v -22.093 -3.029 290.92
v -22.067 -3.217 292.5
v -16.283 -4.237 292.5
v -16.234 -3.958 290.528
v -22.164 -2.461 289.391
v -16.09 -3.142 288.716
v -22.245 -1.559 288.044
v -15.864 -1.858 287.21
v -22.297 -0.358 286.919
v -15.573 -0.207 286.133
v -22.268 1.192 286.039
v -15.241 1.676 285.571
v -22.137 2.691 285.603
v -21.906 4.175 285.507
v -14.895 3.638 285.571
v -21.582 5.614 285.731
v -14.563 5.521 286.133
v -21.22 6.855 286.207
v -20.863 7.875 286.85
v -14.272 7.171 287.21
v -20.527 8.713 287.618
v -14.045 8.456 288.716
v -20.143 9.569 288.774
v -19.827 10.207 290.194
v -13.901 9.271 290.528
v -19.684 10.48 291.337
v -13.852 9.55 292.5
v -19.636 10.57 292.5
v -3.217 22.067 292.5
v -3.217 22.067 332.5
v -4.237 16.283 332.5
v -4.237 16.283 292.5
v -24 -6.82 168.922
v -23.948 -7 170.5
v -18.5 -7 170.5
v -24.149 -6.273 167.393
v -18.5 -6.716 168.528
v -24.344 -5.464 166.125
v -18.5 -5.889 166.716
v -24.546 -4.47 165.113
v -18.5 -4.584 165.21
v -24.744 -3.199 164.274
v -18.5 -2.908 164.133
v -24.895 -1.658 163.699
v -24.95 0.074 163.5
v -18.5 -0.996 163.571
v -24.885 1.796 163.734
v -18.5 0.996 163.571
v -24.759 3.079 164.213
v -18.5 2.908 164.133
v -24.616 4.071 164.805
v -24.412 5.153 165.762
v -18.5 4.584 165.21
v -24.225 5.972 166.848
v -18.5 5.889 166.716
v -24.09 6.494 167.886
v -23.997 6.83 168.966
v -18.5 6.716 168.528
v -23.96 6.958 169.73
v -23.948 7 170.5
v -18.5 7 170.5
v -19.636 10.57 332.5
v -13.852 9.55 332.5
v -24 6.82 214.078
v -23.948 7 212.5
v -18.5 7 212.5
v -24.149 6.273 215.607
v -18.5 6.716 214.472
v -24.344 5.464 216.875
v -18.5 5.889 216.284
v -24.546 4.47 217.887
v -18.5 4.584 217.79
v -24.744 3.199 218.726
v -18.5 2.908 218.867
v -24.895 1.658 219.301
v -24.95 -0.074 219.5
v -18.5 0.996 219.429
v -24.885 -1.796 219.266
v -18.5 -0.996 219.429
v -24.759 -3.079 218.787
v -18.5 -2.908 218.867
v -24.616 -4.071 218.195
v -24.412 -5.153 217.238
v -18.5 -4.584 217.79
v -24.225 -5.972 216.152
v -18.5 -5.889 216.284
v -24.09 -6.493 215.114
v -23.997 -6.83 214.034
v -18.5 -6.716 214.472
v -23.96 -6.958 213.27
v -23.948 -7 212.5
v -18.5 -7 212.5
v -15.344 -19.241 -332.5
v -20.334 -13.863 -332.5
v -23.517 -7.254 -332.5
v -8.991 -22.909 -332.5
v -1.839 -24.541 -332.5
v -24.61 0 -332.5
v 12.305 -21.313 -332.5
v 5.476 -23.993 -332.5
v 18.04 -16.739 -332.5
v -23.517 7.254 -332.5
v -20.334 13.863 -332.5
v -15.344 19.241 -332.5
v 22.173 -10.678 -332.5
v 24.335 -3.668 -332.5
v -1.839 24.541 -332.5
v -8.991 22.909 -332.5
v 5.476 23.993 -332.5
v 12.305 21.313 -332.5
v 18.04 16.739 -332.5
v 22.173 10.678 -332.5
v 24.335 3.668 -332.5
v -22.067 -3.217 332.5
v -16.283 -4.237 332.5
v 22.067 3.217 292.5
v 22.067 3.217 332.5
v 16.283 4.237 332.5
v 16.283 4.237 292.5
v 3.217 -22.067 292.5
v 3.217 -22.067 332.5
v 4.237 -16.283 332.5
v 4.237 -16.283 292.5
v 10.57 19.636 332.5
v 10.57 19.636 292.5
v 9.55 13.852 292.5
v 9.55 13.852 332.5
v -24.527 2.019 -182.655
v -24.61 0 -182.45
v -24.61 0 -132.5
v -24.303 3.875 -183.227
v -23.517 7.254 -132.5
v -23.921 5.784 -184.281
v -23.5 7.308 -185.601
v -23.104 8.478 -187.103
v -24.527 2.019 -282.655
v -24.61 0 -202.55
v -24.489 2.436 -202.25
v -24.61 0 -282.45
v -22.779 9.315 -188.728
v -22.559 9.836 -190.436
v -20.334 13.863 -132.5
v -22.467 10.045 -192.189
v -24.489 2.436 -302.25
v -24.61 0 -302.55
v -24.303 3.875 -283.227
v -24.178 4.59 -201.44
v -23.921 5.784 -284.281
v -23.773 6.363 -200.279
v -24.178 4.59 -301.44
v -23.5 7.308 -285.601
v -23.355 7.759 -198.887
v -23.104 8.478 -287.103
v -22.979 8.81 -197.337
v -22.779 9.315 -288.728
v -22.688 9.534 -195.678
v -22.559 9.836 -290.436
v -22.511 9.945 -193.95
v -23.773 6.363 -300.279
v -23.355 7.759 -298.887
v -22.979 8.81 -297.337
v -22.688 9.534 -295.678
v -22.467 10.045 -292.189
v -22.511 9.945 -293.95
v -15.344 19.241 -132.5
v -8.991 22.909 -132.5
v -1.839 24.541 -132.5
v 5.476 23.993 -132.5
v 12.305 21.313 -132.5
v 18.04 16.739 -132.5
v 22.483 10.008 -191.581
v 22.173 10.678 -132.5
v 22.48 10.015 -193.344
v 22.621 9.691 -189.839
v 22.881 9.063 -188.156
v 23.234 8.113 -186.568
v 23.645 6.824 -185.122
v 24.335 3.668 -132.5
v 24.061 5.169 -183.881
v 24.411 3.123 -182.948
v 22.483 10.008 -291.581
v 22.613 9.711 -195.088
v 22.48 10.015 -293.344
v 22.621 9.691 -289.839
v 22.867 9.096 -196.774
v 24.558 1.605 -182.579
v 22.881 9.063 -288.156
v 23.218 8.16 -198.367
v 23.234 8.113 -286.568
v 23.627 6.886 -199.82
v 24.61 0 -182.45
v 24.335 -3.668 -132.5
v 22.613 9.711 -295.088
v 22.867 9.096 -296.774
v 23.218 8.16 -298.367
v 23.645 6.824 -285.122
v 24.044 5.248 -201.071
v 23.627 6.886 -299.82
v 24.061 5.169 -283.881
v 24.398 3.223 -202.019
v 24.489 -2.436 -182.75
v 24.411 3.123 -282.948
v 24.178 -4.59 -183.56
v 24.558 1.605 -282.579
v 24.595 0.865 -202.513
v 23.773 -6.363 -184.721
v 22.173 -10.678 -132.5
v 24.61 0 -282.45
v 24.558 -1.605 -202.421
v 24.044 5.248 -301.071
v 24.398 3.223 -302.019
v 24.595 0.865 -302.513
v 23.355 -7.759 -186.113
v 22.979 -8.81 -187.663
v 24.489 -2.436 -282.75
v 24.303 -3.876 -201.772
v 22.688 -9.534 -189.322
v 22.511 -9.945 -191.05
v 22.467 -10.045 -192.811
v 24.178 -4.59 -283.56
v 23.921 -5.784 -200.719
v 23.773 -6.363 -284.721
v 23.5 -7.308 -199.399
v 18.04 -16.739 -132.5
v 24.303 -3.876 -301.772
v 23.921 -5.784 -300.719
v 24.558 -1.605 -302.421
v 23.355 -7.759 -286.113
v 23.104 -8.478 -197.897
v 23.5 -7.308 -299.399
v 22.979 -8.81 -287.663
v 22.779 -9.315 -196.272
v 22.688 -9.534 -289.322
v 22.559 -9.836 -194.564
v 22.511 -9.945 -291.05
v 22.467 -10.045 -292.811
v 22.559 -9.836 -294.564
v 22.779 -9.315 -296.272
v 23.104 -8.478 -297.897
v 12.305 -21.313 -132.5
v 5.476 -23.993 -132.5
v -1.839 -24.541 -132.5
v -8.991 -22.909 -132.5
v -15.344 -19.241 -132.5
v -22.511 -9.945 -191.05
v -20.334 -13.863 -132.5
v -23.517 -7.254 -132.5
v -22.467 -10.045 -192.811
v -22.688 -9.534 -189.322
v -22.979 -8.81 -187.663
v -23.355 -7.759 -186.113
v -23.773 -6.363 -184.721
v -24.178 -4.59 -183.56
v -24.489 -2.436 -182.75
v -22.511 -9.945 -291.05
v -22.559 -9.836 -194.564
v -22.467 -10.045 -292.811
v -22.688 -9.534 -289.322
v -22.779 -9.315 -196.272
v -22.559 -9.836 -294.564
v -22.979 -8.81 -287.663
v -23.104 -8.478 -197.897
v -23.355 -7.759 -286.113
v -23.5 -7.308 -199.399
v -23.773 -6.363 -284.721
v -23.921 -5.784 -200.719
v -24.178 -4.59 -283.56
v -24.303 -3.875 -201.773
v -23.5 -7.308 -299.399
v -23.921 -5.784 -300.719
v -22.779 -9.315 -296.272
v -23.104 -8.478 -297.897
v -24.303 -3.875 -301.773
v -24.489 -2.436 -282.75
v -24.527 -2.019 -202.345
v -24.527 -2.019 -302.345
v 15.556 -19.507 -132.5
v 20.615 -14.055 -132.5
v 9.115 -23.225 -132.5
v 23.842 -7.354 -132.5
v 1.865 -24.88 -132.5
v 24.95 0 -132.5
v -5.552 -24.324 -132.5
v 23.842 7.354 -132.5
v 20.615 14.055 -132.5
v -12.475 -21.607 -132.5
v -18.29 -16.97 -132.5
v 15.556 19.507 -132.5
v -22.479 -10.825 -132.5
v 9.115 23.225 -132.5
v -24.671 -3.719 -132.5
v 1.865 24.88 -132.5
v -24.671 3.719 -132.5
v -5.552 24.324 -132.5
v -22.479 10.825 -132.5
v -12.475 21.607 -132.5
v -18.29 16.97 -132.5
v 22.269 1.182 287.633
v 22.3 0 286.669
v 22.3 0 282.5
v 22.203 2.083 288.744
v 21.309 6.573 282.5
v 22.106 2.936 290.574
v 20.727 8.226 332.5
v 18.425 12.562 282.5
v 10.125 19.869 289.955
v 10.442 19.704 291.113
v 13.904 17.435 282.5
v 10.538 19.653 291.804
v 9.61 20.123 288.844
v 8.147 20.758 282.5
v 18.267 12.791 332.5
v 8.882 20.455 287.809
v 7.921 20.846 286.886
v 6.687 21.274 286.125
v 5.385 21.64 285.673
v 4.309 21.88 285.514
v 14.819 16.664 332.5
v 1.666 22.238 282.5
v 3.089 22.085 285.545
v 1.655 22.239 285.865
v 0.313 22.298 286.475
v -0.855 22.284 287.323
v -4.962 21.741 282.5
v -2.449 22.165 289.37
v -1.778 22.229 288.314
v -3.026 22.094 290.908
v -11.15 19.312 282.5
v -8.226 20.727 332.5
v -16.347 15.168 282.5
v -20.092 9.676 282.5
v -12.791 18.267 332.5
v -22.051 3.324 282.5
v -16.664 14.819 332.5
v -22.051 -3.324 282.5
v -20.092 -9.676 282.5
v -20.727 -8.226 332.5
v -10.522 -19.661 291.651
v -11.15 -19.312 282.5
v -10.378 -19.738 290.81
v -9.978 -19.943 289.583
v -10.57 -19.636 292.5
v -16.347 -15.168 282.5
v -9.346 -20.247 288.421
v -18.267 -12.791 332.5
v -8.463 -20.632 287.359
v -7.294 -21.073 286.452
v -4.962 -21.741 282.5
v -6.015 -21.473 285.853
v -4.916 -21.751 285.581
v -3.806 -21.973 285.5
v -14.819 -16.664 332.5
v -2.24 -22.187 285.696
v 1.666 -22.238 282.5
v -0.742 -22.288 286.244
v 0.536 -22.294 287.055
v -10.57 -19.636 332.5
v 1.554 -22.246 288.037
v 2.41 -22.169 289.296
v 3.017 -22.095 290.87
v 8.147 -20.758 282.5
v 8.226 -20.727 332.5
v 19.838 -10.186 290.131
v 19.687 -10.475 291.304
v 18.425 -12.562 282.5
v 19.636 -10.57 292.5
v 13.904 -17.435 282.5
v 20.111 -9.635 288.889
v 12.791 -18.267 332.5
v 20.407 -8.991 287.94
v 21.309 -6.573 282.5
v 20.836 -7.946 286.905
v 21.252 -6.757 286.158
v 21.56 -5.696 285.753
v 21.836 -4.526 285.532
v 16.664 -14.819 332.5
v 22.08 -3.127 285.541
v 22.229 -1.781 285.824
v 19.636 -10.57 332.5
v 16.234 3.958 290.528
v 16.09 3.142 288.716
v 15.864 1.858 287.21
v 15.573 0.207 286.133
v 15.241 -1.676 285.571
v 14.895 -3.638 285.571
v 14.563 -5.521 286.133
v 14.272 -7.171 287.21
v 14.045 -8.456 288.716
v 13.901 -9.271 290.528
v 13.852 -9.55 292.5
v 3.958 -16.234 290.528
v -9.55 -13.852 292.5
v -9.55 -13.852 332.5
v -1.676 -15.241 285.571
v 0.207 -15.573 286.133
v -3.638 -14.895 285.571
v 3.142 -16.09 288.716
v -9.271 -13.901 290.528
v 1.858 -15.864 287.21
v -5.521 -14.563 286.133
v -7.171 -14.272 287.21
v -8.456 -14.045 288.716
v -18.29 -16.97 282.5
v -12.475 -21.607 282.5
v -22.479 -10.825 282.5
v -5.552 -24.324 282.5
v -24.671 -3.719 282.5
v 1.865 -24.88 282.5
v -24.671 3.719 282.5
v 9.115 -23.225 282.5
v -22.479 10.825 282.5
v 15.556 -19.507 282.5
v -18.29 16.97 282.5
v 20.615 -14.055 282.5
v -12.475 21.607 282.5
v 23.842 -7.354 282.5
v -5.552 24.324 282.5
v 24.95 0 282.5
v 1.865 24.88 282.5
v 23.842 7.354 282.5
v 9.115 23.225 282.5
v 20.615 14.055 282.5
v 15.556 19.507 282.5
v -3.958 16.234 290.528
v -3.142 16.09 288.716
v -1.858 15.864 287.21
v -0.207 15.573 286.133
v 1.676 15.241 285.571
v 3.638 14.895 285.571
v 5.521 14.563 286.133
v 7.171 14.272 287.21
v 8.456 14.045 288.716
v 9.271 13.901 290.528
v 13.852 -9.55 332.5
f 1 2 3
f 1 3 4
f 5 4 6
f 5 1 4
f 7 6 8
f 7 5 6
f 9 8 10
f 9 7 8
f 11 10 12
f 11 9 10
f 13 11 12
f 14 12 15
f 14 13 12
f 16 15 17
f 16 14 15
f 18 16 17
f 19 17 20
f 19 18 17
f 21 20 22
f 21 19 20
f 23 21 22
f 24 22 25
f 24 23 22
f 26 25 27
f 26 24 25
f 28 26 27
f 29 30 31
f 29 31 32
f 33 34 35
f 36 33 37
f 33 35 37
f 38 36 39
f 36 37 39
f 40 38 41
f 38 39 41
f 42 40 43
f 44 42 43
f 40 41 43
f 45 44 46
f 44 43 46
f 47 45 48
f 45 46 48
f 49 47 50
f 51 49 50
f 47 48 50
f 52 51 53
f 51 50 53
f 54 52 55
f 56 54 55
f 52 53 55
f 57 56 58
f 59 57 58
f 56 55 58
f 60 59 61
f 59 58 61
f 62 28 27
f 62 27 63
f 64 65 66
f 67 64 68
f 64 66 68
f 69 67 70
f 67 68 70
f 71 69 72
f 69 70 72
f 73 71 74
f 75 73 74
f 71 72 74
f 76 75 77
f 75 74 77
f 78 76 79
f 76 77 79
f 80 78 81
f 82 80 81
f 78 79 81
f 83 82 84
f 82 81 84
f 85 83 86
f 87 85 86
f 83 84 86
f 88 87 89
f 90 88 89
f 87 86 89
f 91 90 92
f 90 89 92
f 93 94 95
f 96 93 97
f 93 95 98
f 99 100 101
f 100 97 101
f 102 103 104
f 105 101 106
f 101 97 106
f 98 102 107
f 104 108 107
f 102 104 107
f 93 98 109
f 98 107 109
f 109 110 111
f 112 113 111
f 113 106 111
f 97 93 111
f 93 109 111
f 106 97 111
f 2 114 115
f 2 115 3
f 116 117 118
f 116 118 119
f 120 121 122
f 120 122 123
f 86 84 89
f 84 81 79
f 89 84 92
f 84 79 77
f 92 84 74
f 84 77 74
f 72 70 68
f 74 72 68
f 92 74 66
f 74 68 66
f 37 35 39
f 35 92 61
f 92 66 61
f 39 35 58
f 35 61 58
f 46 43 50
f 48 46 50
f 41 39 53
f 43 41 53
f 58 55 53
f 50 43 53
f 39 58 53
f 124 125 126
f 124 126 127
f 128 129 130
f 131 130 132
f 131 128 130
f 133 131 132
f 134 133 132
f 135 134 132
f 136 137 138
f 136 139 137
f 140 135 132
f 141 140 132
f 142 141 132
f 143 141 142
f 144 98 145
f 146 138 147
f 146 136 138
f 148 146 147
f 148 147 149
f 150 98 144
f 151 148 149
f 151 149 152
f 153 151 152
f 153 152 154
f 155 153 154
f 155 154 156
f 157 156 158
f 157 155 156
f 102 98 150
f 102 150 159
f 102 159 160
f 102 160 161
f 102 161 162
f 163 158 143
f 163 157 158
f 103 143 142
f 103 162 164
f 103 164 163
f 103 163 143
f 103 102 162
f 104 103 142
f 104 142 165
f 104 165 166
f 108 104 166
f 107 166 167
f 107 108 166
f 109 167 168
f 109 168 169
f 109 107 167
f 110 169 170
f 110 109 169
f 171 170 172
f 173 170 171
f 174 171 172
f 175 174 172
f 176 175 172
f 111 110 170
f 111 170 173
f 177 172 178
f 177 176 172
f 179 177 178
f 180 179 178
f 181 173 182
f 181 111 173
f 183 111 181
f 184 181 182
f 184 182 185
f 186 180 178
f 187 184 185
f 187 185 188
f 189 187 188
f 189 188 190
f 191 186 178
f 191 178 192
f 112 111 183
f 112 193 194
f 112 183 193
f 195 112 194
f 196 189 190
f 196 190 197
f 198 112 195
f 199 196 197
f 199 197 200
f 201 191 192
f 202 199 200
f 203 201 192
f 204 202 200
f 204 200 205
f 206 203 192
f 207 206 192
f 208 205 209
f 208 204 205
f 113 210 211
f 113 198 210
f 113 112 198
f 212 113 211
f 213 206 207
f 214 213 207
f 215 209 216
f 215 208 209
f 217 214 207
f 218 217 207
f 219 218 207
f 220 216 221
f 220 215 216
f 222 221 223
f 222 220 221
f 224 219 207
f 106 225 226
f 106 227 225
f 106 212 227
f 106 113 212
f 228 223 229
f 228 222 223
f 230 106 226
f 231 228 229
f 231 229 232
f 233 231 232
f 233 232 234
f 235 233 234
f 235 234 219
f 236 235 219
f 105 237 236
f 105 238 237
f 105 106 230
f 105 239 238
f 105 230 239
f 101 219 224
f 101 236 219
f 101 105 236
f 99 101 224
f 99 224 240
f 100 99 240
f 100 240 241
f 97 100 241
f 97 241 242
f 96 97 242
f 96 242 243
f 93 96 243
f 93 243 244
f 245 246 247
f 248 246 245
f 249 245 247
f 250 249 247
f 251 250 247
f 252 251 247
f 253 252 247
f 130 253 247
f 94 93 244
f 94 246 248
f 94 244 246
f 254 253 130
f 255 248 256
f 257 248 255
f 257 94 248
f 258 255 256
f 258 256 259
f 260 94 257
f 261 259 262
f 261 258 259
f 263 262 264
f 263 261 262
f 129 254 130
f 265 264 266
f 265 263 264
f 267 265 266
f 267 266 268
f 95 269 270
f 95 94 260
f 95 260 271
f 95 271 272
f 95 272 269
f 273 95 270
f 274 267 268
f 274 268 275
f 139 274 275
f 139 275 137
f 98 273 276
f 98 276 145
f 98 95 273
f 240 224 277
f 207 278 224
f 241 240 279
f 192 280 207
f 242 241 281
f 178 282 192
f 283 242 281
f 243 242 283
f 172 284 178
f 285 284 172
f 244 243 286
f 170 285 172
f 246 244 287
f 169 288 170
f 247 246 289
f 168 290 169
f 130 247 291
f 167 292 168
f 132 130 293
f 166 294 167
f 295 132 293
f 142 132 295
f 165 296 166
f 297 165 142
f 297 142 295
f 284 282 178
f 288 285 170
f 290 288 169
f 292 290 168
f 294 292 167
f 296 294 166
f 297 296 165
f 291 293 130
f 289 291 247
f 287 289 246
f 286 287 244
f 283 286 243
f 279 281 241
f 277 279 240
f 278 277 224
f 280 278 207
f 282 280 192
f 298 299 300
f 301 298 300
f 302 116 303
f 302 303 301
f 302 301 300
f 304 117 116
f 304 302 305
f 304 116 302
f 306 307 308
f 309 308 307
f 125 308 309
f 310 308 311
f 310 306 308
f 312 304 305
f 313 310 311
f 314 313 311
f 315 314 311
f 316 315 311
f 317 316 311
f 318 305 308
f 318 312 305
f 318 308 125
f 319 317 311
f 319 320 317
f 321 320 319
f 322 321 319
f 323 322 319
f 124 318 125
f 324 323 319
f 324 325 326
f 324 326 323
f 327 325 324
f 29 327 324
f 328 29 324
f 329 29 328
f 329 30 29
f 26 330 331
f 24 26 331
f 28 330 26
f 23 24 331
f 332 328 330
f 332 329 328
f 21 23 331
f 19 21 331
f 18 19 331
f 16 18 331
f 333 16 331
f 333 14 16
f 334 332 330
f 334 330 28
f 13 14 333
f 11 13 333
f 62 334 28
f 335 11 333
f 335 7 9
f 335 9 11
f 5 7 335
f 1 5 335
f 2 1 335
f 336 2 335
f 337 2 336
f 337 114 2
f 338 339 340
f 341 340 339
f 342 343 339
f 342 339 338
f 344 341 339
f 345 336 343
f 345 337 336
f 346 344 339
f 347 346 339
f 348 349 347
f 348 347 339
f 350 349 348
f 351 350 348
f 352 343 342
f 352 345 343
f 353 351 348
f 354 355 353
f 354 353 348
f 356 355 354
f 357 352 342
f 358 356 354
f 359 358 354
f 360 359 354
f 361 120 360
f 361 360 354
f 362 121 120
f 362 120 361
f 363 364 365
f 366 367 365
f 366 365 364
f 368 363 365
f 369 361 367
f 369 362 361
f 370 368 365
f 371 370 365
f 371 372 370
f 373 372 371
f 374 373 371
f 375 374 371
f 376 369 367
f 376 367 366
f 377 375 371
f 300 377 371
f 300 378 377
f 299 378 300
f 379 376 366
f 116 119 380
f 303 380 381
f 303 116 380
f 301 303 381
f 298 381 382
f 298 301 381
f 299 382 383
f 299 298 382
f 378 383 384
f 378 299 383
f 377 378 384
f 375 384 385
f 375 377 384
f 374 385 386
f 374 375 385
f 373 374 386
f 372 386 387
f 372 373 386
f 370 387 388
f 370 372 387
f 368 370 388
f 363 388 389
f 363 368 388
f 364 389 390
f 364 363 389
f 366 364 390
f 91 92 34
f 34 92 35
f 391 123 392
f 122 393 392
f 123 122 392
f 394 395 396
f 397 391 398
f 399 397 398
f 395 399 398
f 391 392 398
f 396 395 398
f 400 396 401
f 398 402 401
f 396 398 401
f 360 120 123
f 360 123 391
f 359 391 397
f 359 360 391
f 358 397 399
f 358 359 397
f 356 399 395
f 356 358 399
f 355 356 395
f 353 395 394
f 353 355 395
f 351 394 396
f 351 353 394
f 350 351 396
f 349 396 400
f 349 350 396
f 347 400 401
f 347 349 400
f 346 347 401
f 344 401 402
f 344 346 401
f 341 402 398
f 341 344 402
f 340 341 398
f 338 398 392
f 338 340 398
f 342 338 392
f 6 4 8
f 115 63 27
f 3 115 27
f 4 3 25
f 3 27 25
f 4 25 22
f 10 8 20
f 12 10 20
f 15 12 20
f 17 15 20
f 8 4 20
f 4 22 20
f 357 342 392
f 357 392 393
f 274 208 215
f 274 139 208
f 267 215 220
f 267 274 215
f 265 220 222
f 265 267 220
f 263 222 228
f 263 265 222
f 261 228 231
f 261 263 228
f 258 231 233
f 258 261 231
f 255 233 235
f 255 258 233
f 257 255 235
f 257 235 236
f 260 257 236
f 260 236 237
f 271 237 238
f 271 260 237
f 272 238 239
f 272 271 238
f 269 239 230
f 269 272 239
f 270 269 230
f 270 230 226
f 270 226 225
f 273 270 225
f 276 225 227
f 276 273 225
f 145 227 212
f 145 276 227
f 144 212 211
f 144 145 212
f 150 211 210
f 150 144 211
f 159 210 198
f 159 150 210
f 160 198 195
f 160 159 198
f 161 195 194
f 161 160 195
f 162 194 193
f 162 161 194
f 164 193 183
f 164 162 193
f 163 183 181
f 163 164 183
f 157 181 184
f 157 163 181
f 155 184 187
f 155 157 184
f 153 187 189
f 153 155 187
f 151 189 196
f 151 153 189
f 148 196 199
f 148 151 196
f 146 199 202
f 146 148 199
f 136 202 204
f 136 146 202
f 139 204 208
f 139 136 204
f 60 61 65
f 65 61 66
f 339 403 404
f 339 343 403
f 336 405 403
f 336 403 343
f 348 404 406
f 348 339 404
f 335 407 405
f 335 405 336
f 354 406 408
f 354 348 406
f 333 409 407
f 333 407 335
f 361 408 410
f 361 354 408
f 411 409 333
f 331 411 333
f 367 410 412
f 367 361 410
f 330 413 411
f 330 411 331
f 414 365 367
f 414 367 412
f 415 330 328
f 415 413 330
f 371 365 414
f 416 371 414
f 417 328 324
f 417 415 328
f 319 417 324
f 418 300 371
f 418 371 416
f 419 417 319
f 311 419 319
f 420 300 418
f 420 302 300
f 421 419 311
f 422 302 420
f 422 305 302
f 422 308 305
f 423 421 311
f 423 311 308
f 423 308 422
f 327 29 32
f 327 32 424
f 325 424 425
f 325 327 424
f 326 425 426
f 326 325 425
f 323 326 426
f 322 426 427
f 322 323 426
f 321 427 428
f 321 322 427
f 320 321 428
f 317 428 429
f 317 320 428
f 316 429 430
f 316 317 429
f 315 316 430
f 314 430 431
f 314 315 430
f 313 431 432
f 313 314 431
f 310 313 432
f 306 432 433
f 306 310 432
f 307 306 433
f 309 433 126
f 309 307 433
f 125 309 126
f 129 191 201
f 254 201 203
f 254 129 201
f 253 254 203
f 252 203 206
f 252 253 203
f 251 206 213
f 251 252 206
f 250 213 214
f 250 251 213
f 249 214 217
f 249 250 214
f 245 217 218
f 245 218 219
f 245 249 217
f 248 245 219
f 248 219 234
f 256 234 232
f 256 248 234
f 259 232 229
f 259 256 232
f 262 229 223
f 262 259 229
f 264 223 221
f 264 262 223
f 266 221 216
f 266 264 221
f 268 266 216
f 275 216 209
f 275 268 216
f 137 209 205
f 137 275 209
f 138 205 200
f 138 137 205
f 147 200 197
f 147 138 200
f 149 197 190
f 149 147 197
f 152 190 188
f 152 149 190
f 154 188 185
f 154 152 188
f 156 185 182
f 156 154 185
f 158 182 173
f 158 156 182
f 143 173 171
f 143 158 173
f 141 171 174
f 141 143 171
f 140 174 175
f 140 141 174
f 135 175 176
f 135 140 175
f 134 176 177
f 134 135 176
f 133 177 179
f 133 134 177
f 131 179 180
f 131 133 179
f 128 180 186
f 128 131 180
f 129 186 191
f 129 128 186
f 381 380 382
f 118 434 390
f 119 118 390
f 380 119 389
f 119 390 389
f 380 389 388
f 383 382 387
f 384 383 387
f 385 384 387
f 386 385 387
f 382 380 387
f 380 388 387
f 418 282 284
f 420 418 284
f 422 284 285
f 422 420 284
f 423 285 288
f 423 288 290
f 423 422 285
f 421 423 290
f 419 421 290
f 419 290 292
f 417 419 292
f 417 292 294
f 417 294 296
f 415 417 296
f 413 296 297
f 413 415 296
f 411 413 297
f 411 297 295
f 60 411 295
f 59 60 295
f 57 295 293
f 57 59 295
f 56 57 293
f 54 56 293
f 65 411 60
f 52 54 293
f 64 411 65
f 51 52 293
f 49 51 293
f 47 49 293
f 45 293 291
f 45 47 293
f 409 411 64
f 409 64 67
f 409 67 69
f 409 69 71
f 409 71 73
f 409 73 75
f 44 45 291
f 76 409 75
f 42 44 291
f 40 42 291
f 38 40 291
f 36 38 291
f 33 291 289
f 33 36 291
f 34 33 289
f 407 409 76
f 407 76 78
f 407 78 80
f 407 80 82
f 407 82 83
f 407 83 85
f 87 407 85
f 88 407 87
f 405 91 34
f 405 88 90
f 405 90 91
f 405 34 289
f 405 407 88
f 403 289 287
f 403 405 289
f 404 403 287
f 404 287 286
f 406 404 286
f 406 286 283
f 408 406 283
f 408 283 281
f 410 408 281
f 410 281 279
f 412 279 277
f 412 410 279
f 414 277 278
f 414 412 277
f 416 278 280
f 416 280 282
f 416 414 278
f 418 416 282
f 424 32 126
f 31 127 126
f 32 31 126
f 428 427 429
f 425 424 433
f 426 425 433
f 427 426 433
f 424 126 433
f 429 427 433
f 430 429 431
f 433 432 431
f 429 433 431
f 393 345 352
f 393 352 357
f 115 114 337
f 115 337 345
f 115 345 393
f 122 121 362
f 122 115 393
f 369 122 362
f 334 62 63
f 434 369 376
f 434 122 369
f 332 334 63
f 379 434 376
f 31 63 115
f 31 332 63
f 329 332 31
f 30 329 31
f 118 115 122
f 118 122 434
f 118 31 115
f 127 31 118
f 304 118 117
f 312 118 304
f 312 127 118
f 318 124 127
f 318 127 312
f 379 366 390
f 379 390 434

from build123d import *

# Parameters (mm, degrees)
SKETCH1_R               = 24.95
BOSS_EXTRUDE1_DEPTH     = 332.5
CUT_EXTRUDE1_DEPTH      = 335.366946632
CUT_EXTRUDE1_DEPTH_BACK = 335.366946632
SKETCH2_R               = 10.05
CUT_EXTRUDE2_DEPTH      = 337.253855116
SKETCH5_OUTSIDE_W       = 185.646
SKETCH5_OUTSIDE_H       = 185.646
SKETCH5_OUTSIDE_R       = 24.61
CUT_EXTRUDE4_DEPTH      = 200
SKETCH7_OUTSIDE_W       = 185.646
SKETCH7_OUTSIDE_H       = 185.646
SKETCH7_OUTSIDE_R       = 22.3
CUT_EXTRUDE6_DEPTH      = 50
CUT_EXTRUDE7_DEPTH      = 7
CIRPATTERN1_COUNT       = 4


with BuildPart() as part:
    # Sketch1 → Boss-Extrude1 (new, symmetric)
    with BuildSketch(Plane.XY):
        Circle(SKETCH1_R)
    extrude(amount=BOSS_EXTRUDE1_DEPTH, both=True)

    # Sketch2 → Cut-Extrude1 (cut, two sides: drawn at the far end of the back side and taken through both)
    with BuildSketch(Plane(origin=(0, 0, 0), x_dir=(0, 0, -1), z_dir=(1, 0, 0)).offset(-CUT_EXTRUDE1_DEPTH_BACK)):
        with Locations((192.5, 0)):
            Circle(SKETCH2_R)
        with Locations((292.5, 0)):
            Circle(SKETCH2_R)
    extrude(amount=CUT_EXTRUDE1_DEPTH + CUT_EXTRUDE1_DEPTH_BACK, mode=Mode.SUBTRACT)

    # Sketch3 → Cut-Extrude2 (cut, through all)
    with BuildSketch(Plane(origin=(-18.5, 0, 0), x_dir=(0, 0, -1), z_dir=(1, 0, 0))):
        with BuildLine():
            Line((-212.5, -7), (-170.5, -7))
            ThreePointArc((-170.5, -7), (-163.5, 0), (-170.5, 7))
            Line((-170.5, 7), (-212.5, 7))
            ThreePointArc((-212.5, 7), (-219.5, 0), (-212.5, -7))
        make_face()
    extrude(amount=-CUT_EXTRUDE2_DEPTH, mode=Mode.SUBTRACT)

    # Sketch5 outside → Cut-Extrude4 (cut)
    with BuildSketch(Plane(origin=(0, 0, -332.5), x_dir=(-1, 0, 0), z_dir=(0, 0, -1))):
        Rectangle(SKETCH5_OUTSIDE_W, SKETCH5_OUTSIDE_H)
        Circle(SKETCH5_OUTSIDE_R, mode=Mode.SUBTRACT)
    extrude(amount=-CUT_EXTRUDE4_DEPTH, mode=Mode.SUBTRACT)

    # Sketch7 outside → Cut-Extrude6 (cut)
    with BuildSketch(Plane.XY.offset(332.5)):
        Rectangle(SKETCH7_OUTSIDE_W, SKETCH7_OUTSIDE_H)
        Circle(SKETCH7_OUTSIDE_R, mode=Mode.SUBTRACT)
    extrude(amount=-CUT_EXTRUDE6_DEPTH, mode=Mode.SUBTRACT)

    # Sketch8 → Cut-Extrude7 (cut)
    with BuildSketch(Plane(origin=(3.872354362, 21.961212892, 0), x_dir=(0, 0, 1), z_dir=(0.1736481776669241, 0.9848077530122091, 0))):
        with BuildLine():
            Line((292.5, 7), (332.5, 7))
            ThreePointArc((332.5, 7), (339.5, 0), (332.5, -7))
            Line((332.5, -7), (292.5, -7))
            ThreePointArc((292.5, -7), (285.5, 0), (292.5, 7))
        make_face()
    cut_extrude7 = extrude(amount=-CUT_EXTRUDE7_DEPTH, mode=Mode.SUBTRACT)

    # CirPattern1: Cut-Extrude7 ×4 about axis
    cirpattern1_axis = Axis((0, 0, 282.5), (0, 0, 1))
    for i in range(1, CIRPATTERN1_COUNT):
        add(cut_extrude7.rotate(cirpattern1_axis, i * 360 / CIRPATTERN1_COUNT), mode=Mode.SUBTRACT)


solid = part.part
